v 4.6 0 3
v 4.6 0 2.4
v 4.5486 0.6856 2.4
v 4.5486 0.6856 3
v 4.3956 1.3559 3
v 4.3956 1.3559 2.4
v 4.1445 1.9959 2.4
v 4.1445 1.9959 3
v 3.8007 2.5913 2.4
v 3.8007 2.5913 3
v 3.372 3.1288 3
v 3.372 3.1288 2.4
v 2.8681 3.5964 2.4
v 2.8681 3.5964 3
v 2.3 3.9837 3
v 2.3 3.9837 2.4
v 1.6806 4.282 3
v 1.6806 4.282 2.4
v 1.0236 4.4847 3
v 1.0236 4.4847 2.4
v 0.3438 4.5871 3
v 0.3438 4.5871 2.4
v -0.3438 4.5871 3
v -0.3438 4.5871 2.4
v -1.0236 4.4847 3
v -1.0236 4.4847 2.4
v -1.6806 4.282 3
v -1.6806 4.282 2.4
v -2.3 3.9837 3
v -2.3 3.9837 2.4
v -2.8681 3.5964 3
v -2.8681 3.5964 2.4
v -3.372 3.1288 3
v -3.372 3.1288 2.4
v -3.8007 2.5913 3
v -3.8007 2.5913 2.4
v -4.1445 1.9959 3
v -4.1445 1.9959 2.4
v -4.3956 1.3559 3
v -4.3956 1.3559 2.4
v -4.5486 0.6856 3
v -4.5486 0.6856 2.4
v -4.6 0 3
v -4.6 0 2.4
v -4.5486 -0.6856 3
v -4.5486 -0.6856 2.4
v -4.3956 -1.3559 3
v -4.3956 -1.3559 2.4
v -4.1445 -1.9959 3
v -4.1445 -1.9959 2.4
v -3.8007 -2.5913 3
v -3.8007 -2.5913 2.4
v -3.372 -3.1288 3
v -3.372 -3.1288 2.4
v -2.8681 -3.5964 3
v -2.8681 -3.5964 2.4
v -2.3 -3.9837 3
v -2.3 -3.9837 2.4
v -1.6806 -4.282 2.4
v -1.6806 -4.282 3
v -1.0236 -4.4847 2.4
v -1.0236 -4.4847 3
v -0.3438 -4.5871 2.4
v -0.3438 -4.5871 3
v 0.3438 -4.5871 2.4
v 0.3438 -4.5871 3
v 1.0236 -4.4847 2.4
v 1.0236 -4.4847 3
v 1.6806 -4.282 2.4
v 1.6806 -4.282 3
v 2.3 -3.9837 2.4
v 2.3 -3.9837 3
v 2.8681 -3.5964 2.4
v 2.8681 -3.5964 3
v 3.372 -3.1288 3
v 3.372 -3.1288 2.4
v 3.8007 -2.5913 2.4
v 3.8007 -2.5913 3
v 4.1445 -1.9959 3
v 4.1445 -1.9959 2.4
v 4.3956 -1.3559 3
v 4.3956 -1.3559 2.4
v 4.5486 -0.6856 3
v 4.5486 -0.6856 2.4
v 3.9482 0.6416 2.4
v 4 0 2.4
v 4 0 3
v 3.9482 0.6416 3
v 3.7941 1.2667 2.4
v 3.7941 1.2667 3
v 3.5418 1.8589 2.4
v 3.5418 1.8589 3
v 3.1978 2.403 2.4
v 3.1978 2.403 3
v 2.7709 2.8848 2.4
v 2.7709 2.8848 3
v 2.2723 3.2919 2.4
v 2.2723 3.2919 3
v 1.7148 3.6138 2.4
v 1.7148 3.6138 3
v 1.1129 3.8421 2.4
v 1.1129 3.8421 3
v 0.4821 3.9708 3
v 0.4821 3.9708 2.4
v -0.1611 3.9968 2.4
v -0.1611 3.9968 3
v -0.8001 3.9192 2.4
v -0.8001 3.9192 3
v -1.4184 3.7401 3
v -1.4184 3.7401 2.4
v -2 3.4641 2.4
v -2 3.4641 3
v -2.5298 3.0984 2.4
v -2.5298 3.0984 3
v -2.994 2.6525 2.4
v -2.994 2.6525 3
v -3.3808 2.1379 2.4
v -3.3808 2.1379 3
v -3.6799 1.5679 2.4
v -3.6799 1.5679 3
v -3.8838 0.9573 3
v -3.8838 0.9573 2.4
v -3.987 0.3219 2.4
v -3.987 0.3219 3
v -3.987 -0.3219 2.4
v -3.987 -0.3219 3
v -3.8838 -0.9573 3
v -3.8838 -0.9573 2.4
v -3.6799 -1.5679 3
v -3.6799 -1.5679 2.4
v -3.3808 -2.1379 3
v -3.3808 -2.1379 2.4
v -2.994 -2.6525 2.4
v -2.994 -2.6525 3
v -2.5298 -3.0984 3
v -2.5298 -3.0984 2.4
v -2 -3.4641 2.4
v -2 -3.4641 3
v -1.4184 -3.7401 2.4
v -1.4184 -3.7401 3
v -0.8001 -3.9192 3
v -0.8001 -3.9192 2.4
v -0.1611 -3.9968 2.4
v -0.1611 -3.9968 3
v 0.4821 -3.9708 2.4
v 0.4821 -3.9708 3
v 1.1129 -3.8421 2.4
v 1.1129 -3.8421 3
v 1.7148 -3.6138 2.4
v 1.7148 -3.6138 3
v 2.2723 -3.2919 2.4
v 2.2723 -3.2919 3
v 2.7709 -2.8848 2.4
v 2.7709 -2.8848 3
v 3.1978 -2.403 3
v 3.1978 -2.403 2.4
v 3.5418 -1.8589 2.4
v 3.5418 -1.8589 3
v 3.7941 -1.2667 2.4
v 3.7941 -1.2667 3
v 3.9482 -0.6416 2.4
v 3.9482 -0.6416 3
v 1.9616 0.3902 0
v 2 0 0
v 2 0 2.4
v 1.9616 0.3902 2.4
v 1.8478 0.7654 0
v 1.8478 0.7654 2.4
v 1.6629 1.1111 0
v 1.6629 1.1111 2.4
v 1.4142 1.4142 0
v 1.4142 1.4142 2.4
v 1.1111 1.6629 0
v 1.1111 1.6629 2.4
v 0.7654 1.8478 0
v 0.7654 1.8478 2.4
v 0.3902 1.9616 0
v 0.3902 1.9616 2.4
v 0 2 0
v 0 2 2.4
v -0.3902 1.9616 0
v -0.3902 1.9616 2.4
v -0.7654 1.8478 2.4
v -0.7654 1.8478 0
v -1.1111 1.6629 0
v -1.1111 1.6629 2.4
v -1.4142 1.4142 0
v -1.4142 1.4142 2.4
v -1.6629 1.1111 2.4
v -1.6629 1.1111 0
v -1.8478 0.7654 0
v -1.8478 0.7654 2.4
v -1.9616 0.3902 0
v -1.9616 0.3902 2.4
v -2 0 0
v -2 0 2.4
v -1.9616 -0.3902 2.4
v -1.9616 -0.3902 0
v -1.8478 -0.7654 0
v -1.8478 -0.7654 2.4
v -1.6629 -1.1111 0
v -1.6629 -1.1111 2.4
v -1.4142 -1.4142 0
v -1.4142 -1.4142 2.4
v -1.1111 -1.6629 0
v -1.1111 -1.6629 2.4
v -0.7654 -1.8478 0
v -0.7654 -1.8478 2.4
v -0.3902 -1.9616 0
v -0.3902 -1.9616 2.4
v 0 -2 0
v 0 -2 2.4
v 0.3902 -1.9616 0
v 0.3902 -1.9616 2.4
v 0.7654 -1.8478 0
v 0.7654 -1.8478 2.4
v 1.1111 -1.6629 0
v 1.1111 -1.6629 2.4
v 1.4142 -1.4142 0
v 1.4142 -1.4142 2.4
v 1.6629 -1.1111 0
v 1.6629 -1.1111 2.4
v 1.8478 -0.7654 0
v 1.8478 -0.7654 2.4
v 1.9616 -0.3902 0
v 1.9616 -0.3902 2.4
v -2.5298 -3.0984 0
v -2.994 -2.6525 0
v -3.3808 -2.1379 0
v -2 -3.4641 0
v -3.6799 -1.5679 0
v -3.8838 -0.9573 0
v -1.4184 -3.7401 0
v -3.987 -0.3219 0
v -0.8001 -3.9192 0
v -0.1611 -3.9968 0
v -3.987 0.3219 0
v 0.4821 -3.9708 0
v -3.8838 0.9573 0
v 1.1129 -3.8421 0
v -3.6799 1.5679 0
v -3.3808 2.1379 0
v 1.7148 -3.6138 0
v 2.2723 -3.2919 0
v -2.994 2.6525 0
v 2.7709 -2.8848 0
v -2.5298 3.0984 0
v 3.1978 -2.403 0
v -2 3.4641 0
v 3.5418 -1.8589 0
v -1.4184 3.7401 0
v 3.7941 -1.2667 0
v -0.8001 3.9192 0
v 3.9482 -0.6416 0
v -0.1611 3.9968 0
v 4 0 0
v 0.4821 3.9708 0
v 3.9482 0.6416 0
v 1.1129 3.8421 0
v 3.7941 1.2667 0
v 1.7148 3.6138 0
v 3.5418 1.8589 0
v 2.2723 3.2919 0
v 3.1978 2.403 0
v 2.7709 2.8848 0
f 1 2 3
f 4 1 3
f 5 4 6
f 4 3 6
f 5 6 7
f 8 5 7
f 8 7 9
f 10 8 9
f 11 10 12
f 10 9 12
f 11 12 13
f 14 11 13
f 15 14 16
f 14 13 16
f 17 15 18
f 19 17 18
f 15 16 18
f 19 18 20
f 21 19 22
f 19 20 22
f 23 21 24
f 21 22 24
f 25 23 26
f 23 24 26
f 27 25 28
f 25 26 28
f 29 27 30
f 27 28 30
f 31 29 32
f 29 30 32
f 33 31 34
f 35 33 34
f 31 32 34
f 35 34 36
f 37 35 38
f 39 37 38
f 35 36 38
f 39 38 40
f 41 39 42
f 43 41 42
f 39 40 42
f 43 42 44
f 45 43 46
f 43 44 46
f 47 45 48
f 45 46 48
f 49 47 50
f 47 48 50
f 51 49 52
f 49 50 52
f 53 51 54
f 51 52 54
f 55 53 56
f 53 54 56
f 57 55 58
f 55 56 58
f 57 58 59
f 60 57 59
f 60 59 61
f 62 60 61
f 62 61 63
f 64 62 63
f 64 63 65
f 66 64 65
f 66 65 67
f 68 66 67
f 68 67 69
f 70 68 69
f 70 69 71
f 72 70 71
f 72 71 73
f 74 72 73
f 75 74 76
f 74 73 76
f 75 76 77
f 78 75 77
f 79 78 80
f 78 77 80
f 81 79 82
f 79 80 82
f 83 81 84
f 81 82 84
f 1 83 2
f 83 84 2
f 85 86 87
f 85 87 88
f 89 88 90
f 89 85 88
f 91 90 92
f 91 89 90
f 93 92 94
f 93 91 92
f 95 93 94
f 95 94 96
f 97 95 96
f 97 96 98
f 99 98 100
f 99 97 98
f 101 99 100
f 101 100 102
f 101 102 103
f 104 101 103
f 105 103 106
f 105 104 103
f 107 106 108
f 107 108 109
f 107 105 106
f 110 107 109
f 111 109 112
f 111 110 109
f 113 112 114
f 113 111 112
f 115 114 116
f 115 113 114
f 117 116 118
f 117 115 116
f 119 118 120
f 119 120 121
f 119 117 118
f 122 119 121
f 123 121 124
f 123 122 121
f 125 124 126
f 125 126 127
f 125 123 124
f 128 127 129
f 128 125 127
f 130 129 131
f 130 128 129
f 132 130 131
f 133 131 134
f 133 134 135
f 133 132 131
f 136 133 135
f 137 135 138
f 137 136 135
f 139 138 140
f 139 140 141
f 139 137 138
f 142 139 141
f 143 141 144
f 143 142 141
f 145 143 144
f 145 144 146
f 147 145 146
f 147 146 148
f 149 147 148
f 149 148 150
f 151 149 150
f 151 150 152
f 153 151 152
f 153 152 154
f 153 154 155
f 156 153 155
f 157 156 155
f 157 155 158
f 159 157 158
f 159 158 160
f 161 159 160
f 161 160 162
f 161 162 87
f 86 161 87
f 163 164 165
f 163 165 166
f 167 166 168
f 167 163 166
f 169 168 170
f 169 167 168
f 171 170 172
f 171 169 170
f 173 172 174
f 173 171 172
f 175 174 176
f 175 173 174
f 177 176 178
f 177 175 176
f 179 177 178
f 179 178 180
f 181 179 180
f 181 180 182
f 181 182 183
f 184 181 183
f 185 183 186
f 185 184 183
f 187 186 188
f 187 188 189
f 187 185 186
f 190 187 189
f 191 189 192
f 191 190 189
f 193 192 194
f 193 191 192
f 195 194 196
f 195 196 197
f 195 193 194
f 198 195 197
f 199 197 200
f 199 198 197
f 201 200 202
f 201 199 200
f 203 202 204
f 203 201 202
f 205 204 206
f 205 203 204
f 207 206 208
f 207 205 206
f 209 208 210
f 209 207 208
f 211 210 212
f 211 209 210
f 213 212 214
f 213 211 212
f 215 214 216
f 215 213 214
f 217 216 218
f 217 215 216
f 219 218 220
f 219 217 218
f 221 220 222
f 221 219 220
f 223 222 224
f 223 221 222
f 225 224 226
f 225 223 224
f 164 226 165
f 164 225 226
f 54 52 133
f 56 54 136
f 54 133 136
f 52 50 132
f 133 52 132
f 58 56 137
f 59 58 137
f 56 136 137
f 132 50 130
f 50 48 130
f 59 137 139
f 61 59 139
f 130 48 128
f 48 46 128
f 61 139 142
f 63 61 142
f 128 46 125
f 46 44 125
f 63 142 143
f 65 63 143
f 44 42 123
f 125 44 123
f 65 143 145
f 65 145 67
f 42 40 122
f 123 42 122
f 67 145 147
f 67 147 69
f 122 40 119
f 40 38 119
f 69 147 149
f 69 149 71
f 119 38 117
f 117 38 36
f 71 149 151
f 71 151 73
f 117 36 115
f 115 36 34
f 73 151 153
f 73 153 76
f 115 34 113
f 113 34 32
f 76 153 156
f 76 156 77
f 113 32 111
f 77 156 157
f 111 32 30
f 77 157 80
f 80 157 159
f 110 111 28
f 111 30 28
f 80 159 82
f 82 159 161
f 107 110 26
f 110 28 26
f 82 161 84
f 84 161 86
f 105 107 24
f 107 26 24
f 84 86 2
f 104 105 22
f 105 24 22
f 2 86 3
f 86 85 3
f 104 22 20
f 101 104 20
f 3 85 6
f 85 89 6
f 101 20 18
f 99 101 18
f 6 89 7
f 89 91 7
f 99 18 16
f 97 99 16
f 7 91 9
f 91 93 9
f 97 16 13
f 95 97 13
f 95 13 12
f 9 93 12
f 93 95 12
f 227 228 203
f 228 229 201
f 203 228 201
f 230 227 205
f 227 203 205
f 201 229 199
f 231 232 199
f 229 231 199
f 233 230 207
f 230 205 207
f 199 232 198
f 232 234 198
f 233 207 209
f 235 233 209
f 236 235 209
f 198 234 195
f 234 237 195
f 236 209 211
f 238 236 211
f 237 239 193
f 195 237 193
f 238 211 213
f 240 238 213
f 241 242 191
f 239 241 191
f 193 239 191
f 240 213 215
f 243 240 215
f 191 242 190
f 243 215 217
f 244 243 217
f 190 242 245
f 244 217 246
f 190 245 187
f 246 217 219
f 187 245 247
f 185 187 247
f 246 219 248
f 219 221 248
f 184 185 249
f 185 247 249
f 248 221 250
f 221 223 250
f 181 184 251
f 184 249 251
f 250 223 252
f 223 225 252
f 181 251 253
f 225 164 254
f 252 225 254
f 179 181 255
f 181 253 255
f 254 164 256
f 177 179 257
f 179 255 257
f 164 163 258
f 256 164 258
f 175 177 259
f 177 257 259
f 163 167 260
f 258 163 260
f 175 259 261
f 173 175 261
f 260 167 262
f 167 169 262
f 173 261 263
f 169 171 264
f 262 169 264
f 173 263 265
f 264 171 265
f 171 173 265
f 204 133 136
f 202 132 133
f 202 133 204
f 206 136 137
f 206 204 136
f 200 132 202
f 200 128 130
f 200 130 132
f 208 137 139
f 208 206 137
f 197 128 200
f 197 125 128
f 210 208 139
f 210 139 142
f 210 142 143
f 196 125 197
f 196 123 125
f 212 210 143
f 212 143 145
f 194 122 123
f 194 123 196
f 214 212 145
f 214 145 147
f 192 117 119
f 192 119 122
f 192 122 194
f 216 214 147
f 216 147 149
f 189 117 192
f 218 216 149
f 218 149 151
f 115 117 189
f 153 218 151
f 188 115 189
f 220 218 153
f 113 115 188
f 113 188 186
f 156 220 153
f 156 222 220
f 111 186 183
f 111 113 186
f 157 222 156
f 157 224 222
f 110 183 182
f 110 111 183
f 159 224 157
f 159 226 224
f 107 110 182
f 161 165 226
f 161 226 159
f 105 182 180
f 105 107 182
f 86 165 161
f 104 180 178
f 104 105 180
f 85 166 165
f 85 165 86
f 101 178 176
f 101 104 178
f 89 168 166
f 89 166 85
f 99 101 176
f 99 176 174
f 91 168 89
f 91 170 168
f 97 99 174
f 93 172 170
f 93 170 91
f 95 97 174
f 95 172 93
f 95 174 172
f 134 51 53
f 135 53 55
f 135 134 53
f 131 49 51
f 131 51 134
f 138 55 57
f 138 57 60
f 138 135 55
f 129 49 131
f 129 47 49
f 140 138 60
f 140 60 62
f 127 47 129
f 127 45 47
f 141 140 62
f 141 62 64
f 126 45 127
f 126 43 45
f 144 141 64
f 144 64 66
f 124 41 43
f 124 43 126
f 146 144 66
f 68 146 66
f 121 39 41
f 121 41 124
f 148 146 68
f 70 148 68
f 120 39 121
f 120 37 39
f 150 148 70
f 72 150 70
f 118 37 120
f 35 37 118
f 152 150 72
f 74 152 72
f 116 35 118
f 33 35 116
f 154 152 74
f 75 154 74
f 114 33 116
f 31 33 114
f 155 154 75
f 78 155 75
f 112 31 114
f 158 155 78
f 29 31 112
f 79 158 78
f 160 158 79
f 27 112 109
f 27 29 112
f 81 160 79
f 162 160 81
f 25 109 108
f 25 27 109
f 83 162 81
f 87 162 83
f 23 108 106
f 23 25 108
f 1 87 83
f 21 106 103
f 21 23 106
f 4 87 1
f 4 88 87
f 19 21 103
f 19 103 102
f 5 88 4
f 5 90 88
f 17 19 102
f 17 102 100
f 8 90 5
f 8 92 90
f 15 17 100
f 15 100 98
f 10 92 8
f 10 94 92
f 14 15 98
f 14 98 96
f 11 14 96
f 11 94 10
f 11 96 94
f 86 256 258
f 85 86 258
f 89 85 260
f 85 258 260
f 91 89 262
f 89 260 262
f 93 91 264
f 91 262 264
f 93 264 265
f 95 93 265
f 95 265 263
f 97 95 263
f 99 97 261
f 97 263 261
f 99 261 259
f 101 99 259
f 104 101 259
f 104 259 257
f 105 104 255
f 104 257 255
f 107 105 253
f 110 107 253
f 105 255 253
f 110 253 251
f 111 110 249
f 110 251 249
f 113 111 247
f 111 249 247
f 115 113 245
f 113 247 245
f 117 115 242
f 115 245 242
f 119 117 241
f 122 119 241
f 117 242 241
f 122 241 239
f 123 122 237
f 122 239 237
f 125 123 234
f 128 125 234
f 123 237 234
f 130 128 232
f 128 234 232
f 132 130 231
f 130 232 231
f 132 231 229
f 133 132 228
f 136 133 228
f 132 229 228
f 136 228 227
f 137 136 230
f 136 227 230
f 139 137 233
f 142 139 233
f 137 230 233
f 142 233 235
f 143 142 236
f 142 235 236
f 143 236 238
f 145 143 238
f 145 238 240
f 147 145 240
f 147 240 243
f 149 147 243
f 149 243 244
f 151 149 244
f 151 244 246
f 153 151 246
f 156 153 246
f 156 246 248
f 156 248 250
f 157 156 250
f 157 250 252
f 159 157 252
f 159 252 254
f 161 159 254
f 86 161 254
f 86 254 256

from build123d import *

# Parameters (mm, degrees)
IZIM1_R                     = 4
IZIM1_R_2                   = 2
Y_KSEKLIK_EKSTR_ZYON1_DEPTH = 2.4
IZIM2_R                     = 4.6
IZIM2_R_2                   = 4
Y_KSEKLIK_EKSTR_ZYON2_DEPTH = 0.6


with BuildPart() as part:
    # Çizim1 → Yükseklik-Ekstrüzyon1 (new body)
    with BuildSketch(Plane.XY):
        Circle(IZIM1_R)
        Circle(IZIM1_R_2, mode=Mode.SUBTRACT)
    extrude(amount=Y_KSEKLIK_EKSTR_ZYON1_DEPTH)


with BuildPart() as body_2:
    # Çizim2 → Yükseklik-Ekstrüzyon2 (new body)
    with BuildSketch(Plane.XY.offset(2.4)):
        Circle(IZIM2_R)
        Circle(IZIM2_R_2, mode=Mode.SUBTRACT)
    extrude(amount=Y_KSEKLIK_EKSTR_ZYON2_DEPTH)


solid = Compound([part.part, body_2.part])
